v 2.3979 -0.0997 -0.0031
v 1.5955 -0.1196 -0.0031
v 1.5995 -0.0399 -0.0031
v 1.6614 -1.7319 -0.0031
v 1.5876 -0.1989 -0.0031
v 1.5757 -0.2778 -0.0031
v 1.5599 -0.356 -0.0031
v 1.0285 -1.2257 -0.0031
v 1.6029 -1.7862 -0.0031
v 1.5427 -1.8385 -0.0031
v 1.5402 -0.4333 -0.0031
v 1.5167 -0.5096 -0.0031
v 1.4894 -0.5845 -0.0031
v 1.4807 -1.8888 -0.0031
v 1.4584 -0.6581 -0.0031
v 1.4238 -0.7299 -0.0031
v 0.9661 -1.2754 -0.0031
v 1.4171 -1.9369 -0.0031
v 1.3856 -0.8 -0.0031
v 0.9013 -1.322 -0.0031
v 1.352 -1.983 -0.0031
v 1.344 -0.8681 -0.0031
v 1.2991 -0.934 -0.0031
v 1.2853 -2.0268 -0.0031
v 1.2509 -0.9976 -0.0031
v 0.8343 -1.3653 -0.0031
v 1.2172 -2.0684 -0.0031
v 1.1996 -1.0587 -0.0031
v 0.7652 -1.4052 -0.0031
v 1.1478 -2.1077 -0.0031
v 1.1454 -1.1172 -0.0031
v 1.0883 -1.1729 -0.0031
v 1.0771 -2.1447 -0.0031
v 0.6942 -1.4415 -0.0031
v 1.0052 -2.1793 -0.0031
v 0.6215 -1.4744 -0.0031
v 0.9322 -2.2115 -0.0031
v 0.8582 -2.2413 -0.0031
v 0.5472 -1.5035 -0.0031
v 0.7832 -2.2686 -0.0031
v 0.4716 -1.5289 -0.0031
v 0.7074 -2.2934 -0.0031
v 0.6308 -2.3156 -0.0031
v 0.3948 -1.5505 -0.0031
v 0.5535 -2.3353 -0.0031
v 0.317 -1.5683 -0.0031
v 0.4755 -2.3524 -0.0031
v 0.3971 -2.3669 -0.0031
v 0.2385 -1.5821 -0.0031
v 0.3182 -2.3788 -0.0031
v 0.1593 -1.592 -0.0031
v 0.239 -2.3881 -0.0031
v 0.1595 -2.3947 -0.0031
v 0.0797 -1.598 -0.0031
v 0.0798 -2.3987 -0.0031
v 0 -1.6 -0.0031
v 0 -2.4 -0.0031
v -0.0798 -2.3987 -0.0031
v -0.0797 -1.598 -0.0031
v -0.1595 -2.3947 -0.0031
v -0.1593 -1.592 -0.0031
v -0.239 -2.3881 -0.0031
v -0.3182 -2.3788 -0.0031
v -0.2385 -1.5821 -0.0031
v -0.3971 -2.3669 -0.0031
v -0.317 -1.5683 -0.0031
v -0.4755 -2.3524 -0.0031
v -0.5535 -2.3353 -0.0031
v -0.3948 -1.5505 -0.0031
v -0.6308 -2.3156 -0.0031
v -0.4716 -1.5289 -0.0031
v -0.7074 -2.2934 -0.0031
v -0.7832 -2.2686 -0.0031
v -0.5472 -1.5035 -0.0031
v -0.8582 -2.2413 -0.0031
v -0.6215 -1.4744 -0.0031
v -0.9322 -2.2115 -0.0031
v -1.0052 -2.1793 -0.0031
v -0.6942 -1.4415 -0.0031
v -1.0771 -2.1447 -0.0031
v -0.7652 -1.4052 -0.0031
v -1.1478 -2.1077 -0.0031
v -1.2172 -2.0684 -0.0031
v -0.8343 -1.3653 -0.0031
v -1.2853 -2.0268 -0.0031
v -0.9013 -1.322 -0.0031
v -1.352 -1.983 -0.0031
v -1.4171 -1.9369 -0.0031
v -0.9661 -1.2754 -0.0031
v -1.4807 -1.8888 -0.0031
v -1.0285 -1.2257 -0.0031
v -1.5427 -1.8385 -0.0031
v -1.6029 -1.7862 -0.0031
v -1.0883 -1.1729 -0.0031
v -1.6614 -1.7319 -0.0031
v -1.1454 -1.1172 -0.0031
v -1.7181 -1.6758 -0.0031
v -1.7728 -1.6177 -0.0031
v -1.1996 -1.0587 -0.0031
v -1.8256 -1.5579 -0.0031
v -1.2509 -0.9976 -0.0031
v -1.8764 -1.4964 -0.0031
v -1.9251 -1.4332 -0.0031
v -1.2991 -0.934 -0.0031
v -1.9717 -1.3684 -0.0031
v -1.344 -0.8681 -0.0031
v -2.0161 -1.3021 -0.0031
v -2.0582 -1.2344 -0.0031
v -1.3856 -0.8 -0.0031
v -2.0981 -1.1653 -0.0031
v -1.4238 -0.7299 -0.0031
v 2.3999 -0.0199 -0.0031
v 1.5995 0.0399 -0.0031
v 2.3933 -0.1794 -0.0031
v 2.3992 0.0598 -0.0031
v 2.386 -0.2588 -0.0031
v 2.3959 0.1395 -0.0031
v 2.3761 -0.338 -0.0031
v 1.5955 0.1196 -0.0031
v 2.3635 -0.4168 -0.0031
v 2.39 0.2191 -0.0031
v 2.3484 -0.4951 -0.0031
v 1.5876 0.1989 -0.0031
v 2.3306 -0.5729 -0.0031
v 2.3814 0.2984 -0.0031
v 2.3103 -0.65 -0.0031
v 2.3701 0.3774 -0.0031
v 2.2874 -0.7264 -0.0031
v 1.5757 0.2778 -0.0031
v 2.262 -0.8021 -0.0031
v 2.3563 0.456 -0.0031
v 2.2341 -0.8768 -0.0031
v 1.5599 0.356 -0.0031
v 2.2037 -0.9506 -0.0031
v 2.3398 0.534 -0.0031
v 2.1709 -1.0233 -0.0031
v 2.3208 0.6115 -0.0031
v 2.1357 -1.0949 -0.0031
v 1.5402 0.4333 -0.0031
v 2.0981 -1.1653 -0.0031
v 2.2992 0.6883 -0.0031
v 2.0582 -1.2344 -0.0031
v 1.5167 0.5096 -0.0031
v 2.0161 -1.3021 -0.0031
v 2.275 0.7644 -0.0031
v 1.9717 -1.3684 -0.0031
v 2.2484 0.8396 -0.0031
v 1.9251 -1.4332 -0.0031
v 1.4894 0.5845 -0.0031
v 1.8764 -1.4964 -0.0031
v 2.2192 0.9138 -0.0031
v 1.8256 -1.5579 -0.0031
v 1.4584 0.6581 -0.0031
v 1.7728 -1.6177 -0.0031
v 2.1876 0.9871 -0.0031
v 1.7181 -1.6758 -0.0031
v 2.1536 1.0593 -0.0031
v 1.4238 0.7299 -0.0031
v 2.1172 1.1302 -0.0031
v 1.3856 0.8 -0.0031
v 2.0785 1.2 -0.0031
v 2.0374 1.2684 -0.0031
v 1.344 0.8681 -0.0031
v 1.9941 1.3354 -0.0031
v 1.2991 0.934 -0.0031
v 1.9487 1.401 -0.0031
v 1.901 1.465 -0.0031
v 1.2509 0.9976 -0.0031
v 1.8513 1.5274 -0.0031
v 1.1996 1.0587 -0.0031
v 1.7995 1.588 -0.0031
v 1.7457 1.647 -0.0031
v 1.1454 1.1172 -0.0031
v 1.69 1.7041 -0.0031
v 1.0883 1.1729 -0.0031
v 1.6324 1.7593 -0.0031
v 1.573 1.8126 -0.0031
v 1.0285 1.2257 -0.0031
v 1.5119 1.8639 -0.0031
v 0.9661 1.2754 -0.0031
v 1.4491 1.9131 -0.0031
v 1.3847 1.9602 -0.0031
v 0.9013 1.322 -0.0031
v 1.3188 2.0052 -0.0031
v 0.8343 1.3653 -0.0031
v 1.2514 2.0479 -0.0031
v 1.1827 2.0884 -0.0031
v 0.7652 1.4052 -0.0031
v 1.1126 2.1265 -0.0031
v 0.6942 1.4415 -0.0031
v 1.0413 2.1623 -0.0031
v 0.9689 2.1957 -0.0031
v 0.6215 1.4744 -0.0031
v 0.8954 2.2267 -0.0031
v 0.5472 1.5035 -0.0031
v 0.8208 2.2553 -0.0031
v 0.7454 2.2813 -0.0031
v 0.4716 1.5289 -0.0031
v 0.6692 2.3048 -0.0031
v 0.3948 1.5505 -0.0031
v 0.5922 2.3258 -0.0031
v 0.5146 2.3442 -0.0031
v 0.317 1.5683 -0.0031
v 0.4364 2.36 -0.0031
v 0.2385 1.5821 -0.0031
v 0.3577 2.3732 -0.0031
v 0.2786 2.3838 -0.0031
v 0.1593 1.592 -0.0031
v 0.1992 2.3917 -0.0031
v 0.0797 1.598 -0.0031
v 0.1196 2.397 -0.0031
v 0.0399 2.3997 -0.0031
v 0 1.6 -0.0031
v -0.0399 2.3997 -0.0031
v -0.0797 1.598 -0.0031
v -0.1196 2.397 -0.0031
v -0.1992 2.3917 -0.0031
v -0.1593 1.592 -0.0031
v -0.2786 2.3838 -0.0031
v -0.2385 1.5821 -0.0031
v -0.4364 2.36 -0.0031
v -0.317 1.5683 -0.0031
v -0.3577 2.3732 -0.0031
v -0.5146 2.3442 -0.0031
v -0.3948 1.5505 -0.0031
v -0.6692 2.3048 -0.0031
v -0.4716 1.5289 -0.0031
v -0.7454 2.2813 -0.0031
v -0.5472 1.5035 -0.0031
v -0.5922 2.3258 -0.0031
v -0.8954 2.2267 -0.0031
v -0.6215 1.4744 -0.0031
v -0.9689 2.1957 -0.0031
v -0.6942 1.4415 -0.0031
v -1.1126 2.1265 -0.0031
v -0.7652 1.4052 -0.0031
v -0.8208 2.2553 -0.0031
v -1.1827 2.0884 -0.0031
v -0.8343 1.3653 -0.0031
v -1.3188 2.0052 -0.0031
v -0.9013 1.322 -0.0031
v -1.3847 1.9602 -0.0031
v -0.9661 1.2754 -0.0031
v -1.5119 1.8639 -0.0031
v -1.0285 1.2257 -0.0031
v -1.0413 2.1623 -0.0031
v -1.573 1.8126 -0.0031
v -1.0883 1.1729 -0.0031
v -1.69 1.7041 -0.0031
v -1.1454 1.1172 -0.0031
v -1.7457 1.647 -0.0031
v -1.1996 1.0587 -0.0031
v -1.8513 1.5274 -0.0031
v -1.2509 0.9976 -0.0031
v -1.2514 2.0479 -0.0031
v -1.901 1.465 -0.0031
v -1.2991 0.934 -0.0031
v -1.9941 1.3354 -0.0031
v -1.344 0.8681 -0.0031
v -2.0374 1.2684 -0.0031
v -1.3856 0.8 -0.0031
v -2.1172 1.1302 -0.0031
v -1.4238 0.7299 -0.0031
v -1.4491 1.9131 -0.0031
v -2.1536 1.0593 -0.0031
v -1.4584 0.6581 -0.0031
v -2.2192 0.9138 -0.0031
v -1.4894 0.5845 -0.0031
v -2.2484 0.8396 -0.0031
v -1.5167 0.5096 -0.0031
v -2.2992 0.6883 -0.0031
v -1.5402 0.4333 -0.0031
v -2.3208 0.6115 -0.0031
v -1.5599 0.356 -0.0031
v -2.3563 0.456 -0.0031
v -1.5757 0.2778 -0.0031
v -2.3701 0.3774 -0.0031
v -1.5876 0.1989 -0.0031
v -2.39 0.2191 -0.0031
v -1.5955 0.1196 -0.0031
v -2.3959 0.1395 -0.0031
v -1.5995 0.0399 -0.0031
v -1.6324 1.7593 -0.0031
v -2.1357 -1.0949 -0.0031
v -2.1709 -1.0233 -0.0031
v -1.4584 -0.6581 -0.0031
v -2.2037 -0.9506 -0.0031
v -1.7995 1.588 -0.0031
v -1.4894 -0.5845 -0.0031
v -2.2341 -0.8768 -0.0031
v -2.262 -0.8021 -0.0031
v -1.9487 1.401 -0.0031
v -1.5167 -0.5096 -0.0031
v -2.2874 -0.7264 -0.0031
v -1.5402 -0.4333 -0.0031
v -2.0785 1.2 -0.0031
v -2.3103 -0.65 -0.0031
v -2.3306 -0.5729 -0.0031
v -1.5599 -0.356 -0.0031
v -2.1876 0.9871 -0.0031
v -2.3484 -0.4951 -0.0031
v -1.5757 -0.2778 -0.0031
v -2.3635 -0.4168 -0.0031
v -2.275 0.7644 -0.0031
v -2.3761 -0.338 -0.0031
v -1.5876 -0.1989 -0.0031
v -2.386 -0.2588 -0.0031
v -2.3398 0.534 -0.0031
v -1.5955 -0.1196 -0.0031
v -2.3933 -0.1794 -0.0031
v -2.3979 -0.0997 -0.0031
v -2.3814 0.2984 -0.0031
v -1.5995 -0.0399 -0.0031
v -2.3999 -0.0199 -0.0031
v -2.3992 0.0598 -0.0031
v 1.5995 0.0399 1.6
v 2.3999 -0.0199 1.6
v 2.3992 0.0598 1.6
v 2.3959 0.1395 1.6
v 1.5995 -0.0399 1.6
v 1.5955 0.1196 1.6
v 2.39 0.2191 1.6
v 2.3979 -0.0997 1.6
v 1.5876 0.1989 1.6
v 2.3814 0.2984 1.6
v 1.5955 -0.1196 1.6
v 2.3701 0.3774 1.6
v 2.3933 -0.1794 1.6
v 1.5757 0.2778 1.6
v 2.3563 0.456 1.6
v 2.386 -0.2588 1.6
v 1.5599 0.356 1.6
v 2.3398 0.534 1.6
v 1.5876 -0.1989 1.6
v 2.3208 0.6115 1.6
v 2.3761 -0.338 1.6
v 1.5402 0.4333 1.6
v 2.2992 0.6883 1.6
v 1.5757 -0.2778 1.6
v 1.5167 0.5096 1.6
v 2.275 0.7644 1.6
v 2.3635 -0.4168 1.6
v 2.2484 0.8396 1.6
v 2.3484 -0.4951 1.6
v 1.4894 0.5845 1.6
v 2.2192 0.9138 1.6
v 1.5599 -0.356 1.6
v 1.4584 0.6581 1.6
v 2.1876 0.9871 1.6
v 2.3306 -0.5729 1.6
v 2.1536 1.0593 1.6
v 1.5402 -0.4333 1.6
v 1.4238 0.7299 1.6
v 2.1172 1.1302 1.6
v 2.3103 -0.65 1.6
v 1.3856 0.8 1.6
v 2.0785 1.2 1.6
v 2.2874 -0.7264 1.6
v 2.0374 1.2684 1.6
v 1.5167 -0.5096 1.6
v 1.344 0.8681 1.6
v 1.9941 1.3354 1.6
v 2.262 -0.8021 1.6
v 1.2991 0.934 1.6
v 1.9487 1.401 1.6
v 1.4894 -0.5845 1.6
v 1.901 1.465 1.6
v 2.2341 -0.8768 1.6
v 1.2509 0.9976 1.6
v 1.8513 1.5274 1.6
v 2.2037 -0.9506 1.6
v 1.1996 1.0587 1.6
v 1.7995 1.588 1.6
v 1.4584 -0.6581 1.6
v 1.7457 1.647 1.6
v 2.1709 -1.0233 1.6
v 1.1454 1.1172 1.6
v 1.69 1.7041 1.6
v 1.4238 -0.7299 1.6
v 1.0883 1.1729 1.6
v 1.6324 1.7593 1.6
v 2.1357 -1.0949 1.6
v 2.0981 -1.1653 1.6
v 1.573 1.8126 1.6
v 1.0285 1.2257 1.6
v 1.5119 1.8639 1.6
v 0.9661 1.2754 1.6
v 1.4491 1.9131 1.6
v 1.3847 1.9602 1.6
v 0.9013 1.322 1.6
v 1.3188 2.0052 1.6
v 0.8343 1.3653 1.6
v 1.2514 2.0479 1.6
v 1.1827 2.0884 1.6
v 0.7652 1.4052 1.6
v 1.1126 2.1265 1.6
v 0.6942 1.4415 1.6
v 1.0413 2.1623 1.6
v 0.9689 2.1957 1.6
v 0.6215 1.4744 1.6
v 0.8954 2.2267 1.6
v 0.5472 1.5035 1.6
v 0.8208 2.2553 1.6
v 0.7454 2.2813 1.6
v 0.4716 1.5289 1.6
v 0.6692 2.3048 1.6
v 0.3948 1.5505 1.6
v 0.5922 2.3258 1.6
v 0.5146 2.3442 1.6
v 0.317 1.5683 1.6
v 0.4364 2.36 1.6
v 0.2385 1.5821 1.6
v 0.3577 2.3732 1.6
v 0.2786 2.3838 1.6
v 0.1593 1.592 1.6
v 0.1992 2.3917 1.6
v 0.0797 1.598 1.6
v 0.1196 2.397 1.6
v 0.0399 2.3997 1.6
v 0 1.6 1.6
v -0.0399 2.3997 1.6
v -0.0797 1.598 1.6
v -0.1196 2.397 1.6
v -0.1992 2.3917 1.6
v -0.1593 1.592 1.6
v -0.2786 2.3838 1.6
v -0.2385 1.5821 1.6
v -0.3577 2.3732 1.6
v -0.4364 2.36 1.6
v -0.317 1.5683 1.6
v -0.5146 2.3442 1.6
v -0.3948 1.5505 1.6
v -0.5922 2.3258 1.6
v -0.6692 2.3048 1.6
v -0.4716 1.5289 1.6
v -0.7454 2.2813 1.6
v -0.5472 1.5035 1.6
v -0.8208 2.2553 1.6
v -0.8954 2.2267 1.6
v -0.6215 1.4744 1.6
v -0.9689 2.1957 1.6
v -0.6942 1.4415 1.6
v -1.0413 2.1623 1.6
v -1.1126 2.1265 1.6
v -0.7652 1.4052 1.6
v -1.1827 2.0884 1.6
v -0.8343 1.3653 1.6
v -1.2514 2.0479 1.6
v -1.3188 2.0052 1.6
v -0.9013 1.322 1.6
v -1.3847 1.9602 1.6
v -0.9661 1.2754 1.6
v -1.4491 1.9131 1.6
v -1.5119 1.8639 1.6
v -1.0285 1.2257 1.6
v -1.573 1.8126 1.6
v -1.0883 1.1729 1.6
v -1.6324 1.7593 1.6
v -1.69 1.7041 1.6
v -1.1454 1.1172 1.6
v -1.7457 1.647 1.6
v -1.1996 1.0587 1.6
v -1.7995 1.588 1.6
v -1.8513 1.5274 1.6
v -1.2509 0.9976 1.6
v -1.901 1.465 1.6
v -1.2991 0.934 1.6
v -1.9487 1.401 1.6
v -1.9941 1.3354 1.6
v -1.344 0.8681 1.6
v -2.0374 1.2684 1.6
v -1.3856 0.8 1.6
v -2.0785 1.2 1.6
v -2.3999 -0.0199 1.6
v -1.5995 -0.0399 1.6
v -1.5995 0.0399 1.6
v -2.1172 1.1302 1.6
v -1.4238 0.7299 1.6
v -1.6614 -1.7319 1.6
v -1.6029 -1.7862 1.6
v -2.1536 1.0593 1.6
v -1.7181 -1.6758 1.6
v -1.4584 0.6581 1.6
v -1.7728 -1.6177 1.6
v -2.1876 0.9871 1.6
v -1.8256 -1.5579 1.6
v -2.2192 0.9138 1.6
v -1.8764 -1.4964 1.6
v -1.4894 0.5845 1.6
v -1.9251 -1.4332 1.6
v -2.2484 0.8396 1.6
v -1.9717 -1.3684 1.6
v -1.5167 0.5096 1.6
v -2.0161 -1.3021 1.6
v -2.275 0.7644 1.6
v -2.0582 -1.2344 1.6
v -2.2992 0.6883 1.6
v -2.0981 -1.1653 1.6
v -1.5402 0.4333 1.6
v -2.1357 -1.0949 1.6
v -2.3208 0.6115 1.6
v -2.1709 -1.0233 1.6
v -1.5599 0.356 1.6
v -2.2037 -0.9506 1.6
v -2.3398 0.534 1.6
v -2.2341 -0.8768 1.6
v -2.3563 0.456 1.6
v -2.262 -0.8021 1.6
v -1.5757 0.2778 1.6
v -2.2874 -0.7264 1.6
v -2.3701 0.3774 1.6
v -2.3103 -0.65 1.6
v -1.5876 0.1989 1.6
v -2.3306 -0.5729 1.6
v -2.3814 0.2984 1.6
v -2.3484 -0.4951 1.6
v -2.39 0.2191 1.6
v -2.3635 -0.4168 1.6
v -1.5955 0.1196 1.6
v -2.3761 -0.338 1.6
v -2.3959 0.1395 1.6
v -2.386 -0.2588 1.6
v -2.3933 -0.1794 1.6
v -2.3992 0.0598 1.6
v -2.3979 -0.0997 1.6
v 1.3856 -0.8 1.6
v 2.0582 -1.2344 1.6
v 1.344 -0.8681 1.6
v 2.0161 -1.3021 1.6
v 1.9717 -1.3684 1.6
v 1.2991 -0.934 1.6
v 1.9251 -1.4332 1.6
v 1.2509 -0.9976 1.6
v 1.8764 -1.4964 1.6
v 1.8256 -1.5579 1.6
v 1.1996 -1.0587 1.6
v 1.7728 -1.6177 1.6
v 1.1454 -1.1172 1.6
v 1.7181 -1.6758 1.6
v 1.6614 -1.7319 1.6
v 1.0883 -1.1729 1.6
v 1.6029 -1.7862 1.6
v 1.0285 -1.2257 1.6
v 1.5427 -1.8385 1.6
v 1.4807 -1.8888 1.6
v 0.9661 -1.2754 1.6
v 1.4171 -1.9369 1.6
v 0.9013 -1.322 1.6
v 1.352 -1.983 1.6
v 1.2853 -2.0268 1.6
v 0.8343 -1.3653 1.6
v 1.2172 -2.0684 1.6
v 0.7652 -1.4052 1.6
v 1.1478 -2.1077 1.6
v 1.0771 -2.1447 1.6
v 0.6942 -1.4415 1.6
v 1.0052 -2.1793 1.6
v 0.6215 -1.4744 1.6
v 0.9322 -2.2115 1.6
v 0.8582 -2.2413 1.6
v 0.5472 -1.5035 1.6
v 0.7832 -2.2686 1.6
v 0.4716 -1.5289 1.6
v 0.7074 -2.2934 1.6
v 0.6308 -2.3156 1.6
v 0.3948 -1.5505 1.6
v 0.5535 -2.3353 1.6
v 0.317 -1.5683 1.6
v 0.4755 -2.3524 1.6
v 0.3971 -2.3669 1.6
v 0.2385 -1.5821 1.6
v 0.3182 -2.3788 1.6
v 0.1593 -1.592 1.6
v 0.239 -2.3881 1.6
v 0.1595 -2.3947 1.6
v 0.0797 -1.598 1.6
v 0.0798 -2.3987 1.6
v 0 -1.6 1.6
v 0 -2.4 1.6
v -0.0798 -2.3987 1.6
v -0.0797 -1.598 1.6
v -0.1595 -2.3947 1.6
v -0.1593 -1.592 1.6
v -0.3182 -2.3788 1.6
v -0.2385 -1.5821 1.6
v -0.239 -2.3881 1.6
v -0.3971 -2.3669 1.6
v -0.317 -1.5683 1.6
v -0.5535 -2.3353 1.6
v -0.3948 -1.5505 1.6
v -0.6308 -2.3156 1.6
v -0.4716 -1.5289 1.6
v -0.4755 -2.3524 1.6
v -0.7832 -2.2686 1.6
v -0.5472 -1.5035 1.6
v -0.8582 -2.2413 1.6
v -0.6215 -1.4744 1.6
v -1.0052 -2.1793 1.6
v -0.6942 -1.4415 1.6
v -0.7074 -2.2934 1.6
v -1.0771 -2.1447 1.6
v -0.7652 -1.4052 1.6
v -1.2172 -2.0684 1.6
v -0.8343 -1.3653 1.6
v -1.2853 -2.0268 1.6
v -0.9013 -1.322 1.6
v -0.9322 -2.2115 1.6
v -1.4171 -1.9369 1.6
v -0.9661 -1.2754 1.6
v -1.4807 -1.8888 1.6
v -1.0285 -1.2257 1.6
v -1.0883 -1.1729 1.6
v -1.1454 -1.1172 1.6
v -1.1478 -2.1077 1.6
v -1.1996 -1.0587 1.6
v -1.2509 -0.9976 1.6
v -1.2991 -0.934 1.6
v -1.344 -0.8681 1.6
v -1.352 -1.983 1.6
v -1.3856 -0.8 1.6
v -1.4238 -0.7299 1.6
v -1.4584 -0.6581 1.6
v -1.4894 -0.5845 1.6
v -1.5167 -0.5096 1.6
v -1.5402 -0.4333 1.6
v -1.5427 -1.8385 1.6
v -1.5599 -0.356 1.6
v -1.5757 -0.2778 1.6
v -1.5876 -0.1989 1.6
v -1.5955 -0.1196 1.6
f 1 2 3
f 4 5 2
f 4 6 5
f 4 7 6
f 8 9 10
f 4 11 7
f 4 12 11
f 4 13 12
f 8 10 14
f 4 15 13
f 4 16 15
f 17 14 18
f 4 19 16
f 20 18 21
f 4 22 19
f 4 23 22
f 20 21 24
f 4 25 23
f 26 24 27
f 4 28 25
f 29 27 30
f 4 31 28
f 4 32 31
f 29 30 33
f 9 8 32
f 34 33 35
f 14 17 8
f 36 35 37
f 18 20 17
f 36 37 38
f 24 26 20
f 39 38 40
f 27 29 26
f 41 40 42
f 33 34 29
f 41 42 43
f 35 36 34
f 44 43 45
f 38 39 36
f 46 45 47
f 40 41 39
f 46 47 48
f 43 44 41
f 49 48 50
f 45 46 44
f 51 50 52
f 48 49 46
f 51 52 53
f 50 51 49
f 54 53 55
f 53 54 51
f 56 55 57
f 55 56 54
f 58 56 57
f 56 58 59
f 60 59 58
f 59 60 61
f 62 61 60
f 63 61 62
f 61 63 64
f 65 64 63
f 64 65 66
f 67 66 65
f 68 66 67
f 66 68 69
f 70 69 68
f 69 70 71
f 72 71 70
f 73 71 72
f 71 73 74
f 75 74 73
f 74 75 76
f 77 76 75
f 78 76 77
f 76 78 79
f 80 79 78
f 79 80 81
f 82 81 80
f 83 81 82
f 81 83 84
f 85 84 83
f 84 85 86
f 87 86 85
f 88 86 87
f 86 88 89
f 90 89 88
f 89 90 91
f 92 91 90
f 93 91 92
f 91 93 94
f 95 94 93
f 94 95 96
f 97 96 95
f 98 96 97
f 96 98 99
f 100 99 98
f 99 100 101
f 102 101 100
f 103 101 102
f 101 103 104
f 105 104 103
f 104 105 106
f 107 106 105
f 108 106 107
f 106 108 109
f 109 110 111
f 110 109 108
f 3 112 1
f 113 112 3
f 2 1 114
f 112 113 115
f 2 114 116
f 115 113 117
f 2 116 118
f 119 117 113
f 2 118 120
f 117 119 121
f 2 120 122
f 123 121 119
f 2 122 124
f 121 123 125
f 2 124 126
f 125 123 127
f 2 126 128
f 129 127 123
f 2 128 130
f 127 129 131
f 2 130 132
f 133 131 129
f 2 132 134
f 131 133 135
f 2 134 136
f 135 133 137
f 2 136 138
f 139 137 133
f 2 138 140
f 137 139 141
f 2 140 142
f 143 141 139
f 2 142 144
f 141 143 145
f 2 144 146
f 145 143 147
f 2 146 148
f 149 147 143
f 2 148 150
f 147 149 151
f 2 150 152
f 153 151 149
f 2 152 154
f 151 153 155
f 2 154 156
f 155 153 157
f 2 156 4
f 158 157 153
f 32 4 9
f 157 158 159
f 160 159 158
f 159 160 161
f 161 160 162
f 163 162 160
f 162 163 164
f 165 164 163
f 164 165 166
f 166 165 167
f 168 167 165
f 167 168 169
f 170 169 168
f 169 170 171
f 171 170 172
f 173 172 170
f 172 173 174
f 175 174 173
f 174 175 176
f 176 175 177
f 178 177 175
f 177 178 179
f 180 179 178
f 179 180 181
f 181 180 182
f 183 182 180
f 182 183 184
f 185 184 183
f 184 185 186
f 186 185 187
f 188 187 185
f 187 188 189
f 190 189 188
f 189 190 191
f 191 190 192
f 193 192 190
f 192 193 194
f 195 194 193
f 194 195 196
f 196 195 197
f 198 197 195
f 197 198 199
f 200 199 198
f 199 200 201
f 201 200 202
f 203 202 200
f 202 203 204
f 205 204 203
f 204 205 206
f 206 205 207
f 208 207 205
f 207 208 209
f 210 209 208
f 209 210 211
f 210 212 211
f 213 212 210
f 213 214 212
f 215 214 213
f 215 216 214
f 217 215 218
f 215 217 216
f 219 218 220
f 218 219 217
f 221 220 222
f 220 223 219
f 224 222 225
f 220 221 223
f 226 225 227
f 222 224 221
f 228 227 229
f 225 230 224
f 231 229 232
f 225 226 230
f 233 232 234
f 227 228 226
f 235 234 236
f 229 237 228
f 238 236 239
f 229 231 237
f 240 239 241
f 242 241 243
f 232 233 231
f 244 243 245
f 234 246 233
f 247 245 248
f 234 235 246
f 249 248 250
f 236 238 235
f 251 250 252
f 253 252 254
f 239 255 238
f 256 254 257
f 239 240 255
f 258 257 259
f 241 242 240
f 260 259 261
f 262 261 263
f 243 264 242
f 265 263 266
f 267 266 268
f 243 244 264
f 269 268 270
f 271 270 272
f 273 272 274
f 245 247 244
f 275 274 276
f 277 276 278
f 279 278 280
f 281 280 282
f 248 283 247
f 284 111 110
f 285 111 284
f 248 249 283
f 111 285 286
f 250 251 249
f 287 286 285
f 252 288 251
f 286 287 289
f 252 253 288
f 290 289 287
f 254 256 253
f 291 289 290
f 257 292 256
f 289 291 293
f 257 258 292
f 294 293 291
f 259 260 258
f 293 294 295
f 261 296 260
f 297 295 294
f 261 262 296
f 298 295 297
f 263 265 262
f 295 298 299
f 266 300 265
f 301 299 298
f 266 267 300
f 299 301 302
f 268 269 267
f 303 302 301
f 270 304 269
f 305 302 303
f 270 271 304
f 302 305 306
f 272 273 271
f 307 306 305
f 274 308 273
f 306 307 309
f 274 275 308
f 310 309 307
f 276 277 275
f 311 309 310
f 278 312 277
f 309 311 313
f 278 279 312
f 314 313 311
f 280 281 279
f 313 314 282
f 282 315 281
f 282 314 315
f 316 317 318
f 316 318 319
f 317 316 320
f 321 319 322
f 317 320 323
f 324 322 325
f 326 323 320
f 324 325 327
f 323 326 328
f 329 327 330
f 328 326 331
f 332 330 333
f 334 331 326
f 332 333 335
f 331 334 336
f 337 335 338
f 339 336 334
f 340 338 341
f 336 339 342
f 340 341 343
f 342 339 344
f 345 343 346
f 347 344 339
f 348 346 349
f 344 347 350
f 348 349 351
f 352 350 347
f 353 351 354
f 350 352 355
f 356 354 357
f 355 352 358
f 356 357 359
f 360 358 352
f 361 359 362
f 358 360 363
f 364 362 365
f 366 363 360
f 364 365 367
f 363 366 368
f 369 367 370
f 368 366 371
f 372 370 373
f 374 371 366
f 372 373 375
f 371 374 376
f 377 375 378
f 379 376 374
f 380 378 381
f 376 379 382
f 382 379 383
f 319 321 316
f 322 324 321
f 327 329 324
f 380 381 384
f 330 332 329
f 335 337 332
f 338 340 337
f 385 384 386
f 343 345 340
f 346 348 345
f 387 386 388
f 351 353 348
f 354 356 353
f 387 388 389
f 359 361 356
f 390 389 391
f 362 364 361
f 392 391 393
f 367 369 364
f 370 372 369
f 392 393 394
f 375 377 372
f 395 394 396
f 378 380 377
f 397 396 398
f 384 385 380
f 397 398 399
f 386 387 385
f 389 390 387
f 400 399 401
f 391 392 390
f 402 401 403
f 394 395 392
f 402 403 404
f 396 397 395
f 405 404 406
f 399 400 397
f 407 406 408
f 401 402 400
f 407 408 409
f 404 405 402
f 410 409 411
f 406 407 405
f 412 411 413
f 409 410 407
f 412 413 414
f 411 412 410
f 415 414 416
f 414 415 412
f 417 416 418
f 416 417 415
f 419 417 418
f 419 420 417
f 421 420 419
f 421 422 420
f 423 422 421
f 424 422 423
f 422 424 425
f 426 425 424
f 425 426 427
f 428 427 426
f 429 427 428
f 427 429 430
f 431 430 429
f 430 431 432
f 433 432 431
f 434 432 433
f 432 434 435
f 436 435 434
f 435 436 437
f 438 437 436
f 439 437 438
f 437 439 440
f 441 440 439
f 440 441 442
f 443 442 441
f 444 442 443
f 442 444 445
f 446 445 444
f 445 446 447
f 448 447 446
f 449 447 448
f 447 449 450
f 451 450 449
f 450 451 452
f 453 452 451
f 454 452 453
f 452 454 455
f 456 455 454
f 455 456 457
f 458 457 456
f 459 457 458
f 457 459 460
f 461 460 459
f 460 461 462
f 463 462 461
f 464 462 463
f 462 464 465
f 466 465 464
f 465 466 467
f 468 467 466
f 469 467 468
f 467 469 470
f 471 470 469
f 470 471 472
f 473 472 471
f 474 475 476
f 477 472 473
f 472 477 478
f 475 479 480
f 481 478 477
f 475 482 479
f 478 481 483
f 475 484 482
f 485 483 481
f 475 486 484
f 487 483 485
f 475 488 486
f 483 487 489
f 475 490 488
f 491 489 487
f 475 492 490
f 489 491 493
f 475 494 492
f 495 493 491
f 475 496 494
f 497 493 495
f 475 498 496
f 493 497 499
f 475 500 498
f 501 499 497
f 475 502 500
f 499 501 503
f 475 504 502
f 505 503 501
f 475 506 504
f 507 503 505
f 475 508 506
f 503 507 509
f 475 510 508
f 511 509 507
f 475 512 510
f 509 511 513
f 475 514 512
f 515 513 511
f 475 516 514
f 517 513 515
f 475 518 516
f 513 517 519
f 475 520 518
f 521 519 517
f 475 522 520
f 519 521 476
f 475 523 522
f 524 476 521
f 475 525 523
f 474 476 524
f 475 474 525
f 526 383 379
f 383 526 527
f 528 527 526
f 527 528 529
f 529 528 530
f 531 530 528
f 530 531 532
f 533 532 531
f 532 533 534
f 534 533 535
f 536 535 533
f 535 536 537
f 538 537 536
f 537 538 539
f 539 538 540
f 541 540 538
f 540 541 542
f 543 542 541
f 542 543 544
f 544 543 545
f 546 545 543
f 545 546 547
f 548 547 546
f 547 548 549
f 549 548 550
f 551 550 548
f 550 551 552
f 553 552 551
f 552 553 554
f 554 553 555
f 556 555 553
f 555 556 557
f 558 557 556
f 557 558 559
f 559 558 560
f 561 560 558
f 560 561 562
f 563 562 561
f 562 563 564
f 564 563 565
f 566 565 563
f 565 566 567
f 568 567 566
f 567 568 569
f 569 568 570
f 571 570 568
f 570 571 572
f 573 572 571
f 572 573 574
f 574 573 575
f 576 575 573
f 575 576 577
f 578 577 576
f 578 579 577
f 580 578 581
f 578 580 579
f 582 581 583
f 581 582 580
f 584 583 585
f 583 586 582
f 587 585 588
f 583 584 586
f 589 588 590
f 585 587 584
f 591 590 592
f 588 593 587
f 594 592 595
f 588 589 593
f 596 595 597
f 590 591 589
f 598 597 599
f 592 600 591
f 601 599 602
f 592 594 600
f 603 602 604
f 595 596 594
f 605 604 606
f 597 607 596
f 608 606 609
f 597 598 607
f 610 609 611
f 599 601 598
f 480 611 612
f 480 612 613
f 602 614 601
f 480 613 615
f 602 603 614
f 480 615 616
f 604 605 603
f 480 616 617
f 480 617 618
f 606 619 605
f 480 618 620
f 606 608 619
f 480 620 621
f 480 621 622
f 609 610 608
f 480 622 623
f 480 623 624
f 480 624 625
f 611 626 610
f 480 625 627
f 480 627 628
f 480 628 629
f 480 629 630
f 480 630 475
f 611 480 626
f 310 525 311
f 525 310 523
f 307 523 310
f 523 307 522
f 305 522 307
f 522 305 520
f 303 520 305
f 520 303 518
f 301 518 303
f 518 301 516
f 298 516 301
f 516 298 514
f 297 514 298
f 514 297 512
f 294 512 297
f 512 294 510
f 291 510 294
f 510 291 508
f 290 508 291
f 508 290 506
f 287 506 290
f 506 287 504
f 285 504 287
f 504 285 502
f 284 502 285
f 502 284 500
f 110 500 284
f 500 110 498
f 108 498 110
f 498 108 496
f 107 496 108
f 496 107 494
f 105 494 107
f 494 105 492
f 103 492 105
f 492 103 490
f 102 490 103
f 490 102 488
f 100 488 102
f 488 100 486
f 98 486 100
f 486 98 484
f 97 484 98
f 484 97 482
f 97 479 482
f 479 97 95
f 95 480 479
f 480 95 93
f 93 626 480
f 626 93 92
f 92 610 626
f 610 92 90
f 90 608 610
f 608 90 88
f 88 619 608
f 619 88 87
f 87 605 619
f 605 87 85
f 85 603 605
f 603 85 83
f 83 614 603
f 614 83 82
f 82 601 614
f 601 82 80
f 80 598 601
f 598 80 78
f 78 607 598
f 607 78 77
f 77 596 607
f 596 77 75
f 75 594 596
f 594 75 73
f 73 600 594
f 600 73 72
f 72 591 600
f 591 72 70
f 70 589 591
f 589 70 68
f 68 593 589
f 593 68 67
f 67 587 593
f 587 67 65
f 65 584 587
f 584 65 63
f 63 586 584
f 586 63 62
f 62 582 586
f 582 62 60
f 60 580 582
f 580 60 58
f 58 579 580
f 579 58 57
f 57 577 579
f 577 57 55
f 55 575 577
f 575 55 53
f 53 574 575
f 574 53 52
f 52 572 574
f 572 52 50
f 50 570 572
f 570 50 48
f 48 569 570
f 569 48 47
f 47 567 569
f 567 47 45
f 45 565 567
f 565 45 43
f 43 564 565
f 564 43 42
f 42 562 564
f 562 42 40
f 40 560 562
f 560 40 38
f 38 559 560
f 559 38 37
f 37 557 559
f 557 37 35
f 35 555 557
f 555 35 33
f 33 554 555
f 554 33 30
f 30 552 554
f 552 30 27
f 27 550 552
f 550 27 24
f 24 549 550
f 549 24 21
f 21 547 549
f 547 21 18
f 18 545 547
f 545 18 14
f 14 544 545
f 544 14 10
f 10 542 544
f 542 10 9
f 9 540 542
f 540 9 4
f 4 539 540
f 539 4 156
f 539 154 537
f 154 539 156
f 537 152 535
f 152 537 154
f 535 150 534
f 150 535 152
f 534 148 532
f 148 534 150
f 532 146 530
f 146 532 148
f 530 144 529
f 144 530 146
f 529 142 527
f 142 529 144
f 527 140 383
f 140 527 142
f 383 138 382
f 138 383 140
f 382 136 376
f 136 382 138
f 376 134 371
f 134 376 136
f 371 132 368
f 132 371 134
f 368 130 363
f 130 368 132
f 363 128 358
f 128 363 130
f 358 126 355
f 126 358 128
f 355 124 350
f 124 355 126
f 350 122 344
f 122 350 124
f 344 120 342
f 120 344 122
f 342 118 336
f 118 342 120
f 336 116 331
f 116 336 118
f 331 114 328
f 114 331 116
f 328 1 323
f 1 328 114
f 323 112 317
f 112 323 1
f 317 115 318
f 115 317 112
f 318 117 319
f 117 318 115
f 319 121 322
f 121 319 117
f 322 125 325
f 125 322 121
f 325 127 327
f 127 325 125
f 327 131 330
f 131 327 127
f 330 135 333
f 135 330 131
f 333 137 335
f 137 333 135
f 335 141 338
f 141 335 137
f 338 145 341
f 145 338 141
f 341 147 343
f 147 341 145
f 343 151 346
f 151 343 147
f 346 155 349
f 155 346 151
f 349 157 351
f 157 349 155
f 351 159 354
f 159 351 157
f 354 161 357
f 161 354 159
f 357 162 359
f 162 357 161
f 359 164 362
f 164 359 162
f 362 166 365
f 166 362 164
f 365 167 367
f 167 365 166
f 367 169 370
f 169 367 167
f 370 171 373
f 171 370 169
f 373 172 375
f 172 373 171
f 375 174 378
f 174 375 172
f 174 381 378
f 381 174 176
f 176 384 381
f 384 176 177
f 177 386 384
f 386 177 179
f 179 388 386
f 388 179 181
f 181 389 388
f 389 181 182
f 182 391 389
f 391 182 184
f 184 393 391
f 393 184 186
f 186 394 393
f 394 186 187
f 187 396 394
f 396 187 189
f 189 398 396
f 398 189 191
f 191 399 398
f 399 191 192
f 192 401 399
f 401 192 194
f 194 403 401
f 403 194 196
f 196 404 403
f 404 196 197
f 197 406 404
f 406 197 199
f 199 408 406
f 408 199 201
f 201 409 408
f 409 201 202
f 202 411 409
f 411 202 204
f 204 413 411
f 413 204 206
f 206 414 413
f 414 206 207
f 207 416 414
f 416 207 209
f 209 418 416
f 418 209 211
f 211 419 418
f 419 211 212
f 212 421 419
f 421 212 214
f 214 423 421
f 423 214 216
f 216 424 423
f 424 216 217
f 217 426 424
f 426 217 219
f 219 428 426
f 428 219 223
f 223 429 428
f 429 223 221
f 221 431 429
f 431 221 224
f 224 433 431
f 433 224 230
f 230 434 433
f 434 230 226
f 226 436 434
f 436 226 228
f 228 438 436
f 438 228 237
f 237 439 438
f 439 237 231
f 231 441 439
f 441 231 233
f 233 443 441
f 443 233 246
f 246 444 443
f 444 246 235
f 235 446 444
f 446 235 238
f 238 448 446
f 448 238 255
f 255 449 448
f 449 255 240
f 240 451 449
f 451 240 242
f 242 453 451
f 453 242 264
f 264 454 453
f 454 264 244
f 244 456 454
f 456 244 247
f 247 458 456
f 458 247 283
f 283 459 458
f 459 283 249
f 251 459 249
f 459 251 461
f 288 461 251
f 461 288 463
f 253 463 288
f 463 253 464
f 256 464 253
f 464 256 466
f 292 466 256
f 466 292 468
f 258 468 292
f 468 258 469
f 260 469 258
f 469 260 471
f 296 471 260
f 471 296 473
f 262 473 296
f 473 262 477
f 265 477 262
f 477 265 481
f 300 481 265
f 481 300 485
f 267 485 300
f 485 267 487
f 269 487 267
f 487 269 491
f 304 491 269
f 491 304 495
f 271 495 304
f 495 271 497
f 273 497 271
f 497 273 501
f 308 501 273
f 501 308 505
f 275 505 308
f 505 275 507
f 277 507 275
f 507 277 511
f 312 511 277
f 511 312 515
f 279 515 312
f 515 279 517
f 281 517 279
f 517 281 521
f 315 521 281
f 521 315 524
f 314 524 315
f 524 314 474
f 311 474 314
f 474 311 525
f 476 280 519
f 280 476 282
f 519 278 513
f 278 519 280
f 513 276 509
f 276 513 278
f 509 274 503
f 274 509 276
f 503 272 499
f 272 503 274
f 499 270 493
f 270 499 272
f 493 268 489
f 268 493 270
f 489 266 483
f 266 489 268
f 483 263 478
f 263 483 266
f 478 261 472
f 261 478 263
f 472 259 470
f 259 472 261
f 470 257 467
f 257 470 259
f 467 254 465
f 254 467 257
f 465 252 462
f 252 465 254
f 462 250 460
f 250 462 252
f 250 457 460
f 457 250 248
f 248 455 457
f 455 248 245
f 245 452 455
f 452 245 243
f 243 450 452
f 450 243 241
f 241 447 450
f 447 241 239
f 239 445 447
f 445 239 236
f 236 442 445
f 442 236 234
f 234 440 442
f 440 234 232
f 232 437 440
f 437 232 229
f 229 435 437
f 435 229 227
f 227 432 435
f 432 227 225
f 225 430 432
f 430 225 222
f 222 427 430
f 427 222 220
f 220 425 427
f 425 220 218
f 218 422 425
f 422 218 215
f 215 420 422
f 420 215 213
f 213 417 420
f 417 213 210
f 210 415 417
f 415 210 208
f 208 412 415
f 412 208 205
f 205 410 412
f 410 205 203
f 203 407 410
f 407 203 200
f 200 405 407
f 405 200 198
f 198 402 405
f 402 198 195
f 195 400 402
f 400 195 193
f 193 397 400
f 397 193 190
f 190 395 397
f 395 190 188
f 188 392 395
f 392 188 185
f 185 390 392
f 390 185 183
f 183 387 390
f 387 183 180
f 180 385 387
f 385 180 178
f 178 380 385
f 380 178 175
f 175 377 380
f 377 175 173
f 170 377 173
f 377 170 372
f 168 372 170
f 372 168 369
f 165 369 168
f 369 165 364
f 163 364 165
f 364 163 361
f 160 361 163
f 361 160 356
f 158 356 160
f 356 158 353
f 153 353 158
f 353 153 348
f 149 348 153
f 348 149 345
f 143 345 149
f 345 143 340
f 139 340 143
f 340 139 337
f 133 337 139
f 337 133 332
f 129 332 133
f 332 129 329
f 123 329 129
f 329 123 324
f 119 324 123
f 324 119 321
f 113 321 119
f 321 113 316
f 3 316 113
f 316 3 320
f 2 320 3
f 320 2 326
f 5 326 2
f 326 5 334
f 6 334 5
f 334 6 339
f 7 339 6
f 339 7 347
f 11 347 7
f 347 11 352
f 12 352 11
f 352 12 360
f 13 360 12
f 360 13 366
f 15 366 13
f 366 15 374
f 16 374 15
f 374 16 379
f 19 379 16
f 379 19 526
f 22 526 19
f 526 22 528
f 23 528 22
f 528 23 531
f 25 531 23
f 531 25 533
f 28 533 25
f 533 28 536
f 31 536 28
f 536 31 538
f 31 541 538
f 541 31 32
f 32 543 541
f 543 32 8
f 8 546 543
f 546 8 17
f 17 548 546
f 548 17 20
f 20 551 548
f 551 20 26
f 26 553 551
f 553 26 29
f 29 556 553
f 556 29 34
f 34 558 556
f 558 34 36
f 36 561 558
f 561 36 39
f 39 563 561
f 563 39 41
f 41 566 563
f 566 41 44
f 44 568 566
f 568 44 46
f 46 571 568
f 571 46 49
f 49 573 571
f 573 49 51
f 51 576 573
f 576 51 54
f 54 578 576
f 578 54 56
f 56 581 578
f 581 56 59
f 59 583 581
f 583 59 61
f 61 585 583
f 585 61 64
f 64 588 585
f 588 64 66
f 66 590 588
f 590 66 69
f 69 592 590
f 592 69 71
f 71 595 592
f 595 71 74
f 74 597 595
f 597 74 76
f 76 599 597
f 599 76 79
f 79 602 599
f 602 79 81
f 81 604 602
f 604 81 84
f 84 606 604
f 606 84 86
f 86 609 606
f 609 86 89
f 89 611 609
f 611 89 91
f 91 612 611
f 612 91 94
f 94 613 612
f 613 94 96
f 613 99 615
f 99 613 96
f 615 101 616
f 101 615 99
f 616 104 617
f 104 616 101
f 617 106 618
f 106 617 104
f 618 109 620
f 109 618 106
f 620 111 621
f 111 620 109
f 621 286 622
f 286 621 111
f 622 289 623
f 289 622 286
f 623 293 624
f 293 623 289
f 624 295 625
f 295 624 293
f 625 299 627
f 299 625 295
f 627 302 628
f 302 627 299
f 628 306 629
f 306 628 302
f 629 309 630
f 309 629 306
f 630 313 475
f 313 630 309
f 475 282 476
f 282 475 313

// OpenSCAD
use <../lib.scad>
use <4182p03.scad>
use <s/196955as02.scad>
use <s/196955as03.scad>
$fa=1; $fs=0.2;
function ldraw_lib__4182p03d01(realsolid=false) = [
// 0 Train Door  1 x  4 x  5 Right White Stripe w Sticker DB 7745
// 0 Name: 4182p03d01.dat
// 0 Author: Steffen [Steffen]
// 0 !LDRAW_ORG Shortcut UPDATE 2012-02
// 0 !LICENSE Licensed under CC BY 2.0 and CC BY 4.0 : see CAreadme.txt
// 
// 0 BFC CERTIFY CW
  [0,"BFC","CERTIFY"],
  [0,"BFC","CW"],
// 
// 0 !CMDLINE -c4
// 
// 0 !HISTORY 2012-08-09 [PTadmin] Official Update 2012-02
// 
// 
// 1 16 0 0 0 1 0 0 0 1 0 0 0 1 4182p03.dat
  [1,16,0,0,0,1,0,0,0,1,0,0,0,1, ldraw_lib__4182p03(realsolid)],
// 0 // We cannot write this
// 0 // 1 4 -10 96 30 0 1 0 0 0 -1 -1 0 0 196955a.dat
// 0 // here, because then the sticker would look ugly. Instead we do this trick:
// 1 15 -10 96 30 0 1 0 0 0 -1 -1 0 0 s\196955as02.dat
  [1,15,-10,96,30,0,1,0,0,0,-1,-1,0,0, ldraw_lib__s__196955as02(realsolid)],
// 1 16 -10 96 30 0 1 0 0 0 -1 -1 0 0 s\196955as03.dat
  [1,16,-10,96,30,0,1,0,0,0,-1,-1,0,0, ldraw_lib__s__196955as03(realsolid)],
];
module ldraw_lib__4182p03d01(step=0, col=false, unit=2/5, alt=false, line=0.2, solid=!$preview)
    makepoly(ldraw_lib__4182p03d01(solid), step=step, col=col, unit=unit, alt=alt, line=line, solid=solid);
ldraw_lib__4182p03d01(line=0.2);
